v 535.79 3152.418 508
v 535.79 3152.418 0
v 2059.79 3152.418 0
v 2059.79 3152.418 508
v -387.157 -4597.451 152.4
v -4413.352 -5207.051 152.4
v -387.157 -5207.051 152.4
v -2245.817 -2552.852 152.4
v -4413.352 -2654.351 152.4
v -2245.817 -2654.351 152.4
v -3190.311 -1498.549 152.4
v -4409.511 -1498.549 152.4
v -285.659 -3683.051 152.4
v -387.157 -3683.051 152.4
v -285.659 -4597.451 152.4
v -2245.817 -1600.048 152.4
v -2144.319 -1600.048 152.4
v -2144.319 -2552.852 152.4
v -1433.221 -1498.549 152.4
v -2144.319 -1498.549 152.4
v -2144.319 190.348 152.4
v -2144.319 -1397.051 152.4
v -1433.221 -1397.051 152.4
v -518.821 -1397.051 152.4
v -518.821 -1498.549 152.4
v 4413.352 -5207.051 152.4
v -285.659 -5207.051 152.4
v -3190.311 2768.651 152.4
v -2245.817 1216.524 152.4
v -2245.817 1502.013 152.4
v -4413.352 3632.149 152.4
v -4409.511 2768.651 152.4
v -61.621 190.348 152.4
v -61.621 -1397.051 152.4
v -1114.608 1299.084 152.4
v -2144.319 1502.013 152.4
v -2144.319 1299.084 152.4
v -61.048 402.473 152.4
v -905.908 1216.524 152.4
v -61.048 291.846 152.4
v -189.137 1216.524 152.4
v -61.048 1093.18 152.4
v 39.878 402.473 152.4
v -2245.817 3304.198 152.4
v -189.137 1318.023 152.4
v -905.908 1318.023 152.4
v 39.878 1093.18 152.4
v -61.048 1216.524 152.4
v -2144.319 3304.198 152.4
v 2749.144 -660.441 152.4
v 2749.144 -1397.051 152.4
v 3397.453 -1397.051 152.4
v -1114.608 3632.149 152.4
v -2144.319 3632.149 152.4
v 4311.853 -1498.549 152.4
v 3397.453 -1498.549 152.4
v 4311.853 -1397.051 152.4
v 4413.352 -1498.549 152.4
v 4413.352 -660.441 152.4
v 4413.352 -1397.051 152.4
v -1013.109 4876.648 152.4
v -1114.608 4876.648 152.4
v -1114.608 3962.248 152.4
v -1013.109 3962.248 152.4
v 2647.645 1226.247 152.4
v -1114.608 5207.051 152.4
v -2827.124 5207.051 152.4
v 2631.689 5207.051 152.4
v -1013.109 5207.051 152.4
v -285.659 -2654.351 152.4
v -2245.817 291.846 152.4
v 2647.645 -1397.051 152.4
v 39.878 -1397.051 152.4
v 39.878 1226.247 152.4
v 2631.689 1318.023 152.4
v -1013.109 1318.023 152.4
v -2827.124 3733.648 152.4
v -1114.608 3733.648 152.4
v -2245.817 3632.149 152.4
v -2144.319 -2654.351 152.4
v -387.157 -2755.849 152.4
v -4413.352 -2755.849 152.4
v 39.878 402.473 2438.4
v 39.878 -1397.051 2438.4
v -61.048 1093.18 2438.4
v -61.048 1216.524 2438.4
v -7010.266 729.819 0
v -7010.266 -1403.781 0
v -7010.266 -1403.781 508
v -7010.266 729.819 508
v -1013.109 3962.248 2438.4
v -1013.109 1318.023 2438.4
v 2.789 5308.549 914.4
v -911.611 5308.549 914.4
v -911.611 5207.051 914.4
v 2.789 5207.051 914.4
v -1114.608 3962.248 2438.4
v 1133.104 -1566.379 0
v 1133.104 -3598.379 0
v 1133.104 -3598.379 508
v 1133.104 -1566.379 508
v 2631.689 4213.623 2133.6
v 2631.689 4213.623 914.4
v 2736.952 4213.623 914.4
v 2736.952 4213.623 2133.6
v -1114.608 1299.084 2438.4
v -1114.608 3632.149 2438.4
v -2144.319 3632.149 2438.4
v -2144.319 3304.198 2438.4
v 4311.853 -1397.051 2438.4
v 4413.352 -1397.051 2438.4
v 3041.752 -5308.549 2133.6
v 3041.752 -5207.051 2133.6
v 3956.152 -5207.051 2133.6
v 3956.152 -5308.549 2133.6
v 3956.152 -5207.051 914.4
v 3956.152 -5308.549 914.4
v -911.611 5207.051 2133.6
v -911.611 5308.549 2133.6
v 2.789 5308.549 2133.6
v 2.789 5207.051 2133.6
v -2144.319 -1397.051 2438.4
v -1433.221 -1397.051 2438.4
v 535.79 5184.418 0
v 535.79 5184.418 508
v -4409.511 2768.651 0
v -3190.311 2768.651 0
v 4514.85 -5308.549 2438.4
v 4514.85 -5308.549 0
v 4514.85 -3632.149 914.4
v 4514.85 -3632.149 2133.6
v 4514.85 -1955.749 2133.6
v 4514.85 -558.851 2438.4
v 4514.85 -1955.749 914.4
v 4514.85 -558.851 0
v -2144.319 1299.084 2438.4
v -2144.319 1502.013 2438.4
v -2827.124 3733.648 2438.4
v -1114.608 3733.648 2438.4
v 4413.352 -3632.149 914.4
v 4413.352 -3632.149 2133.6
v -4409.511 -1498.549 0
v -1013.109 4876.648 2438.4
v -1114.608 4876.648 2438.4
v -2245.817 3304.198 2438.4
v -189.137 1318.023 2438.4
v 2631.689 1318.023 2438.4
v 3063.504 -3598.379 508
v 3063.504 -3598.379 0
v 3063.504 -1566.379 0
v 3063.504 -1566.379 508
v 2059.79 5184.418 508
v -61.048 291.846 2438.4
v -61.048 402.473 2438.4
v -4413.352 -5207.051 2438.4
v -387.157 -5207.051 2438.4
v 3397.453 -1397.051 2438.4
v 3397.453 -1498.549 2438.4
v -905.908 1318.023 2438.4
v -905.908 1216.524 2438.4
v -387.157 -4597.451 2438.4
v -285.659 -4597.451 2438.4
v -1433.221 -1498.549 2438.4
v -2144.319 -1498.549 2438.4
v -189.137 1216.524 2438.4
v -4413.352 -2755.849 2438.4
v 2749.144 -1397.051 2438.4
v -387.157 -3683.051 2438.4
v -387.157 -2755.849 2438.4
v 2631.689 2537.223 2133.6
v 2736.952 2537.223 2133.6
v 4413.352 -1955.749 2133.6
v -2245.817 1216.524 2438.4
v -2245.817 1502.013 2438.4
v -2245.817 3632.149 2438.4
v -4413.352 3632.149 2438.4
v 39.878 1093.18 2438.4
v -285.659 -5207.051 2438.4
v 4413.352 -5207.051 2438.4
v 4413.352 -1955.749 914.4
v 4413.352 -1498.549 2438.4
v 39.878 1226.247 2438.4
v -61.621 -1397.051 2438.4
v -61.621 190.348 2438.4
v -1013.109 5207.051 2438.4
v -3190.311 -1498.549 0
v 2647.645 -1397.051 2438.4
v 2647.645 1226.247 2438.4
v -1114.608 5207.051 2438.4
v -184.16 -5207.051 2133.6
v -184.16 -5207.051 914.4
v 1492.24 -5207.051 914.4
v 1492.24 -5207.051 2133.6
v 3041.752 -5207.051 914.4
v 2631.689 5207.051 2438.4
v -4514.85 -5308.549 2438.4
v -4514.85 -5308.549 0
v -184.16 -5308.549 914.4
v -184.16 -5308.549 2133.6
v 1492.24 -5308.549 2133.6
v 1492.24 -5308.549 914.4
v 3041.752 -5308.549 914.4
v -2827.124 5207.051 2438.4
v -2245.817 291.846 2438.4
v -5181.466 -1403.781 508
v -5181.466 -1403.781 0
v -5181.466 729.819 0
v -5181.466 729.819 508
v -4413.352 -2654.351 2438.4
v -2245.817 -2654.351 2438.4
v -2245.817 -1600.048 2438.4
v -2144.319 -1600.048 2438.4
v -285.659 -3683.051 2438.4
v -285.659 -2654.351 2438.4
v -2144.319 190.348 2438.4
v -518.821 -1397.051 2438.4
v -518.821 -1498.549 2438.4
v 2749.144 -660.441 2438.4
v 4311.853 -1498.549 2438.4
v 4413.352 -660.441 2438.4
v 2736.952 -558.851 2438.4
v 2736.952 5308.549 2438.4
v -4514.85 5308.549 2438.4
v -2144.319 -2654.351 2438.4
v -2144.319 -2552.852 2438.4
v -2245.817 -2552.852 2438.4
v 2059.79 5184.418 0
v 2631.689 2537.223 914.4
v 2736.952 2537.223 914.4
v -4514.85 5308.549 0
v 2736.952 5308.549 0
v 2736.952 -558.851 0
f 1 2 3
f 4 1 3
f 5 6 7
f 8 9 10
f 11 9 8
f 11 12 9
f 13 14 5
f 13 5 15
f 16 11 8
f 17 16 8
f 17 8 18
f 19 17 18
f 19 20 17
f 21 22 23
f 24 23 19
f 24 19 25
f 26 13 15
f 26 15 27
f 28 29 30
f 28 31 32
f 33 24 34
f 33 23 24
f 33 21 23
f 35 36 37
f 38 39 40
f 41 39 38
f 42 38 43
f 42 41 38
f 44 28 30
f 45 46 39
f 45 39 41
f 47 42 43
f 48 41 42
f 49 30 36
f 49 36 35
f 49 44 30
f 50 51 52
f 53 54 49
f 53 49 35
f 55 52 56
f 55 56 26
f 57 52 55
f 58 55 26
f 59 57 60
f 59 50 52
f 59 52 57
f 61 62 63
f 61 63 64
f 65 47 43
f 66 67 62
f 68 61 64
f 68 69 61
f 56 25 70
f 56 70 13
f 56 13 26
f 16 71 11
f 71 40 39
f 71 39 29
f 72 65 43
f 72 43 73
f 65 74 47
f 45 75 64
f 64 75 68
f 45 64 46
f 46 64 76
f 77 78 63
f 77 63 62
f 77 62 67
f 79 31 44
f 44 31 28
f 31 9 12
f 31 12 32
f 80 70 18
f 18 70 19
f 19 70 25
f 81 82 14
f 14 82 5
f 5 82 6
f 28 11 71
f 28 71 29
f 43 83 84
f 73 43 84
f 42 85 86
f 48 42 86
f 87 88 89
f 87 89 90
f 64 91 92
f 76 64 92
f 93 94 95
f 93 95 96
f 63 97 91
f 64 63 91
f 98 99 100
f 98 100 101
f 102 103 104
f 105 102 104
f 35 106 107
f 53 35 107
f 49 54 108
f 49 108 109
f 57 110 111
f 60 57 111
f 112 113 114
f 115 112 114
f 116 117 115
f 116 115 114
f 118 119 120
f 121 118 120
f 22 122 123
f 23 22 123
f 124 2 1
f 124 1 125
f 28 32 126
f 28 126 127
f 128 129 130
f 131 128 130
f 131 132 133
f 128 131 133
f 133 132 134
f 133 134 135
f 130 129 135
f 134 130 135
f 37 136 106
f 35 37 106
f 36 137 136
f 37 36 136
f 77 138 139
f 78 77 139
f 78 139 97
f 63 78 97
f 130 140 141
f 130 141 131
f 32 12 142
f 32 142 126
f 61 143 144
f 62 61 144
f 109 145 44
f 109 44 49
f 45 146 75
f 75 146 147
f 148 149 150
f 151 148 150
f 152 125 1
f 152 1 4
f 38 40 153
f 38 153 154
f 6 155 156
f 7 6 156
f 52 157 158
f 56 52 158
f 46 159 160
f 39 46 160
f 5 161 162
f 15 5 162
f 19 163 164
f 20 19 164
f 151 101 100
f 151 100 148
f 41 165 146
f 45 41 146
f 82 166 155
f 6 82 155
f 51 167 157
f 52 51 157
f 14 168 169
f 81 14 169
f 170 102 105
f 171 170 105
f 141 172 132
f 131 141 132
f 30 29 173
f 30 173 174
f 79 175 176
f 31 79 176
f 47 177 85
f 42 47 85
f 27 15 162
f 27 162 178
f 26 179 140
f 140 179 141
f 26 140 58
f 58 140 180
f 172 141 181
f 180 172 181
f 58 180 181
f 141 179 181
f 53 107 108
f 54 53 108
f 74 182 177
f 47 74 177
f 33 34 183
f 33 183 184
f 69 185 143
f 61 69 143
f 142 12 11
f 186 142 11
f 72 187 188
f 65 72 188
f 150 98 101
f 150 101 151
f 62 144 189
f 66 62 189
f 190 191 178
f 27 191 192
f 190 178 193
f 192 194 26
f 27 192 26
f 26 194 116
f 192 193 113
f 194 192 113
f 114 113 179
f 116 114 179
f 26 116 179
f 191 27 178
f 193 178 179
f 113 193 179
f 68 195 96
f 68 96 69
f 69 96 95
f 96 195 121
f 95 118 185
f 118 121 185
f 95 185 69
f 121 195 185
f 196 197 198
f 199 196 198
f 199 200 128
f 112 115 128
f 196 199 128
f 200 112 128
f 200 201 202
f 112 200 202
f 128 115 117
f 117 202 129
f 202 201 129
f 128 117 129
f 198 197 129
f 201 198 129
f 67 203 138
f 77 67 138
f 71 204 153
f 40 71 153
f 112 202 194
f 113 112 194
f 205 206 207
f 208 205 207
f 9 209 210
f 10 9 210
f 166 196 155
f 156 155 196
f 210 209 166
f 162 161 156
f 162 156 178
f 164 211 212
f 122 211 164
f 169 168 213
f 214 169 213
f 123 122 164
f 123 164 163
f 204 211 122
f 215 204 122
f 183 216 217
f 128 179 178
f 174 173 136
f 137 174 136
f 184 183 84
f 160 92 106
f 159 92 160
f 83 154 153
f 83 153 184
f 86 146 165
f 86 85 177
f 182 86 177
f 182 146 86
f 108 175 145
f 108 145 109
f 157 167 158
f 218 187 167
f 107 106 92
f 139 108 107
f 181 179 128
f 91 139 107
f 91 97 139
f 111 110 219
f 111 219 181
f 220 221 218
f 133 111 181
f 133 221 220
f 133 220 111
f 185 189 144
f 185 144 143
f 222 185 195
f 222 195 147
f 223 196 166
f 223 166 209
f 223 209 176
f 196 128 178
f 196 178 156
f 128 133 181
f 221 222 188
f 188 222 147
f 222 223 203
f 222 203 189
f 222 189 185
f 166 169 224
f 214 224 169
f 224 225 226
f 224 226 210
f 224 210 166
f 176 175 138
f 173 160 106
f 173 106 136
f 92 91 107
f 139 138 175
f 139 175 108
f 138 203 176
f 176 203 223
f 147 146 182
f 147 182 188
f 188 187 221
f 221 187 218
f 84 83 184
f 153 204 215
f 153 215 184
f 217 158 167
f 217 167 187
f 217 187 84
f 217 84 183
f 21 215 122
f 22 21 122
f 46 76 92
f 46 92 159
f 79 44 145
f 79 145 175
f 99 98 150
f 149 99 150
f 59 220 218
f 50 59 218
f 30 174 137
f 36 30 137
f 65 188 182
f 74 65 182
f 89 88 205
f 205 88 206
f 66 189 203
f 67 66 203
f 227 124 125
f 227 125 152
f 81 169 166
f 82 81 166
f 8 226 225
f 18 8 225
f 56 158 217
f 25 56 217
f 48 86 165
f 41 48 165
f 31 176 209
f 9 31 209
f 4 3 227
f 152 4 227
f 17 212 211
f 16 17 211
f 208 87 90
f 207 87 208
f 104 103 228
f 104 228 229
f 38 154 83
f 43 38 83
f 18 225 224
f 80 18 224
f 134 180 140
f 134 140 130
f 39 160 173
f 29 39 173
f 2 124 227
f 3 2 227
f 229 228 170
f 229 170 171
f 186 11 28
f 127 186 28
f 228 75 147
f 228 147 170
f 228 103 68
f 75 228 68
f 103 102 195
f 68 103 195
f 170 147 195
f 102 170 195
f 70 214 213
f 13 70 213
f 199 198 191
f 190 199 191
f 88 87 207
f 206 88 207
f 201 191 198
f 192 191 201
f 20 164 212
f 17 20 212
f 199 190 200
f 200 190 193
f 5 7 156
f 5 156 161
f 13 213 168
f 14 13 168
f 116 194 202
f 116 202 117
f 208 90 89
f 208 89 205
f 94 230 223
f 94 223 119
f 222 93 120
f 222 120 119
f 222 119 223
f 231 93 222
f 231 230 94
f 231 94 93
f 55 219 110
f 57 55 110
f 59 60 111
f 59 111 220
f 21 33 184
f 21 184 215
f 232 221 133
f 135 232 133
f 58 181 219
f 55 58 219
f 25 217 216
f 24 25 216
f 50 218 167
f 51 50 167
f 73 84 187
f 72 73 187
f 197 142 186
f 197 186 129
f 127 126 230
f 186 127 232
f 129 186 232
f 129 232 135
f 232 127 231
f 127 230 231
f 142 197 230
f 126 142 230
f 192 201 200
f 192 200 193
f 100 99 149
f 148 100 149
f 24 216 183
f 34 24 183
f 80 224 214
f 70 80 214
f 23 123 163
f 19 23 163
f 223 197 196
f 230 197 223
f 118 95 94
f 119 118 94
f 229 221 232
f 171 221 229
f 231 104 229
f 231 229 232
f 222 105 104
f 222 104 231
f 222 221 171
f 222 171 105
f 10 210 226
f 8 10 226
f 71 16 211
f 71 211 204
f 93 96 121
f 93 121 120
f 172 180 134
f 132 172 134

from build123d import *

# Parameters (mm, degrees)
F0_W      = 9029.7
F0_H      = 10617.0984
F1_DEPTH  = 2438.4
F2_W      = 1777.8984
F2_H      = 5867.4
F3_DEPTH  = 3048
F4_W      = 101.4984
F4_H      = 1802.184701
F5_DEPTH  = 2286
F7_W      = 344.260856
F7_H      = 1676.4
F7_W_2    = 1676.4
F7_H_2    = 449.916839
F7_W_3    = 914.4
F7_H_3    = 416.589737
F7_W_4    = 399.9269
F7_H_4    = 566.562653
F8_DEPTH  = 1219.2
F9_W      = 1219.2
F9_H      = 4267.2
F10_DEPTH = 1524
F11_W     = 1524
F11_H     = 2032
F12_DEPTH = 508
F13_W     = 1930.4
F13_H     = 2032
F14_DEPTH = 508
F15_W     = 1828.8
F15_H     = 2133.6
F16_DEPTH = 508


with BuildPart() as f1:
    # F0 (on Top) → F1 (new body)
    with BuildSketch(Plane.XY):
        Rectangle(F0_W, F0_H)
    extrude(amount=F1_DEPTH)

    # F2 (on face) → F3 (cut)
    with BuildSketch(Plane.XY.offset(2438.4)):
        with Locations((3625.9008, 2374.8492)):
            Rectangle(F2_W, F2_H)
    extrude(amount=-F3_DEPTH, mode=Mode.SUBTRACT)

    # F4 (on face) → F5 (cut)
    with BuildSketch(Plane.XY.offset(2438.4)):
        Polygon((-285.65856, -5207.0508), (4413.3516, -5207.0508), (4413.3516, -3784.5492), (4413.3516, -2108.1492), (4413.3516, -1498.5492), (4311.8532, -1498.5492), (4311.8532, -1397.0508), (4413.3516, -1397.0508), (4413.3516, -660.44064), (2749.1436, -660.44064), (2749.1436, -1397.0508), (3397.4532, -1397.0508), (3397.4532, -1498.5492), (-285.65856, -1498.5492), (-518.820502, -1498.5492), (-518.820502, -1397.0508), (-61.620502, -1397.0508), (-61.620502, 190.3476), (-2144.318902, 190.3476), (-2144.318902, -1397.0508), (-1433.220502, -1397.0508), (-1433.220502, -1498.5492), (-2144.318902, -1498.5492), (-2144.318902, -1600.0476), (-2245.817302, -1600.0476), (-2245.817302, 291.846), (-2152.462959, 291.846), (-61.047517, 291.846), (-61.047517, 402.47348), (39.877898, 402.47348), (39.877898, -1397.0508), (2647.6452, -1397.0508), (2647.6452, 1226.246595), (39.877898, 1226.246595), (39.877898, 1093.179703), (-61.047517, 1093.179703), (-61.047517, 1216.52446), (-189.13725, 1216.52446), (-189.13725, 1318.02286), (2631.689145, 1318.02286), (2631.689145, 5207.0508), (-1013.109255, 5207.0508), (-1013.109255, 4876.6476), (-1114.607655, 4876.6476), (-1114.607655, 5207.0508), (-2827.123678, 5207.0508), (-2827.123678, 3733.6476), (-1114.607655, 3733.6476), (-1114.607655, 3962.2476), (-1013.109255, 3962.2476), (-1013.109255, 1318.02286), (-905.907869, 1318.02286), (-905.907869, 1216.52446), (-2152.462959, 1216.52446), (-2245.817302, 1216.52446), (-2245.817302, 1502.013326), (-2245.817302, 3304.198027), (-2245.817302, 3632.1492), (-4413.3516, 3632.1492), (-4413.3516, -2654.3508), (-2245.817302, -2654.3508), (-2245.817302, -2552.8524), (-2144.318902, -2552.8524), (-2144.318902, -2654.3508), (-285.65856, -2654.3508), (-285.65856, -3683.0508), (-387.15696, -3683.0508), (-387.15696, -2755.8492), (-4413.3516, -2755.8492), (-4413.3516, -5207.0508), (-387.15696, -5207.0508), (-387.15696, -4597.4508), (-285.65856, -4597.4508), align=None)
        with Locations((-2195.068102, 2403.105676)):
            Rectangle(F4_W, F4_H)
        Polygon((-2144.318902, 3632.1492), (-2144.318902, 3304.198027), (-2144.318902, 1502.013326), (-2144.318902, 1299.08371), (-1114.607655, 1299.08371), (-1114.607655, 3632.1492), align=None)
    extrude(amount=-F5_DEPTH, mode=Mode.SUBTRACT)

    # F7 (on offset) → F8 (cut)
    with BuildSketch(Plane.XY.offset(914.4)):
        with Locations((4507.505655, -2793.9492)):
            Rectangle(F7_W, F7_H)
        with Locations((654.03984, -5240.704536)):
            Rectangle(F7_W_2, F7_H_2)
        with Locations((3498.9516, -5257.368088)):
            Rectangle(F7_W_3, F7_H_3)
        with Locations((2759.411931, 3375.42286)):
            Rectangle(F7_W_4, F7_H)
        with Locations((-454.410855, 5215.709209)):
            Rectangle(F7_W_3, F7_H_4)
    extrude(amount=F8_DEPTH, mode=Mode.SUBTRACT)

    # F9 (on face) → F10 (cut)
    with BuildSketch(Plane.XY.offset(152.4)):
        with Locations((-3799.910784, 635.0508)):
            Rectangle(F9_W, F9_H)
    extrude(amount=-F10_DEPTH, mode=Mode.SUBTRACT)


with BuildPart() as f12:
    # F11 (on Top) → F12 (new body)
    with BuildSketch(Plane.XY):
        with Locations((1297.790164, 4168.41835)):
            Rectangle(F11_W, F11_H)
    extrude(amount=F12_DEPTH)


with BuildPart() as f14:
    # F13 (on Top) → F14 (new body)
    with BuildSketch(Plane.XY):
        with Locations((2098.304471, -2582.379182)):
            Rectangle(F13_W, F13_H)
    extrude(amount=F14_DEPTH)


with BuildPart() as f16:
    # F15 (on Top) → F16 (new body)
    with BuildSketch(Plane.XY):
        with Locations((-6095.86642, -336.980605)):
            Rectangle(F15_W, F15_H)
    extrude(amount=F16_DEPTH)


solid = Compound([f1.part, f12.part, f14.part, f16.part])
